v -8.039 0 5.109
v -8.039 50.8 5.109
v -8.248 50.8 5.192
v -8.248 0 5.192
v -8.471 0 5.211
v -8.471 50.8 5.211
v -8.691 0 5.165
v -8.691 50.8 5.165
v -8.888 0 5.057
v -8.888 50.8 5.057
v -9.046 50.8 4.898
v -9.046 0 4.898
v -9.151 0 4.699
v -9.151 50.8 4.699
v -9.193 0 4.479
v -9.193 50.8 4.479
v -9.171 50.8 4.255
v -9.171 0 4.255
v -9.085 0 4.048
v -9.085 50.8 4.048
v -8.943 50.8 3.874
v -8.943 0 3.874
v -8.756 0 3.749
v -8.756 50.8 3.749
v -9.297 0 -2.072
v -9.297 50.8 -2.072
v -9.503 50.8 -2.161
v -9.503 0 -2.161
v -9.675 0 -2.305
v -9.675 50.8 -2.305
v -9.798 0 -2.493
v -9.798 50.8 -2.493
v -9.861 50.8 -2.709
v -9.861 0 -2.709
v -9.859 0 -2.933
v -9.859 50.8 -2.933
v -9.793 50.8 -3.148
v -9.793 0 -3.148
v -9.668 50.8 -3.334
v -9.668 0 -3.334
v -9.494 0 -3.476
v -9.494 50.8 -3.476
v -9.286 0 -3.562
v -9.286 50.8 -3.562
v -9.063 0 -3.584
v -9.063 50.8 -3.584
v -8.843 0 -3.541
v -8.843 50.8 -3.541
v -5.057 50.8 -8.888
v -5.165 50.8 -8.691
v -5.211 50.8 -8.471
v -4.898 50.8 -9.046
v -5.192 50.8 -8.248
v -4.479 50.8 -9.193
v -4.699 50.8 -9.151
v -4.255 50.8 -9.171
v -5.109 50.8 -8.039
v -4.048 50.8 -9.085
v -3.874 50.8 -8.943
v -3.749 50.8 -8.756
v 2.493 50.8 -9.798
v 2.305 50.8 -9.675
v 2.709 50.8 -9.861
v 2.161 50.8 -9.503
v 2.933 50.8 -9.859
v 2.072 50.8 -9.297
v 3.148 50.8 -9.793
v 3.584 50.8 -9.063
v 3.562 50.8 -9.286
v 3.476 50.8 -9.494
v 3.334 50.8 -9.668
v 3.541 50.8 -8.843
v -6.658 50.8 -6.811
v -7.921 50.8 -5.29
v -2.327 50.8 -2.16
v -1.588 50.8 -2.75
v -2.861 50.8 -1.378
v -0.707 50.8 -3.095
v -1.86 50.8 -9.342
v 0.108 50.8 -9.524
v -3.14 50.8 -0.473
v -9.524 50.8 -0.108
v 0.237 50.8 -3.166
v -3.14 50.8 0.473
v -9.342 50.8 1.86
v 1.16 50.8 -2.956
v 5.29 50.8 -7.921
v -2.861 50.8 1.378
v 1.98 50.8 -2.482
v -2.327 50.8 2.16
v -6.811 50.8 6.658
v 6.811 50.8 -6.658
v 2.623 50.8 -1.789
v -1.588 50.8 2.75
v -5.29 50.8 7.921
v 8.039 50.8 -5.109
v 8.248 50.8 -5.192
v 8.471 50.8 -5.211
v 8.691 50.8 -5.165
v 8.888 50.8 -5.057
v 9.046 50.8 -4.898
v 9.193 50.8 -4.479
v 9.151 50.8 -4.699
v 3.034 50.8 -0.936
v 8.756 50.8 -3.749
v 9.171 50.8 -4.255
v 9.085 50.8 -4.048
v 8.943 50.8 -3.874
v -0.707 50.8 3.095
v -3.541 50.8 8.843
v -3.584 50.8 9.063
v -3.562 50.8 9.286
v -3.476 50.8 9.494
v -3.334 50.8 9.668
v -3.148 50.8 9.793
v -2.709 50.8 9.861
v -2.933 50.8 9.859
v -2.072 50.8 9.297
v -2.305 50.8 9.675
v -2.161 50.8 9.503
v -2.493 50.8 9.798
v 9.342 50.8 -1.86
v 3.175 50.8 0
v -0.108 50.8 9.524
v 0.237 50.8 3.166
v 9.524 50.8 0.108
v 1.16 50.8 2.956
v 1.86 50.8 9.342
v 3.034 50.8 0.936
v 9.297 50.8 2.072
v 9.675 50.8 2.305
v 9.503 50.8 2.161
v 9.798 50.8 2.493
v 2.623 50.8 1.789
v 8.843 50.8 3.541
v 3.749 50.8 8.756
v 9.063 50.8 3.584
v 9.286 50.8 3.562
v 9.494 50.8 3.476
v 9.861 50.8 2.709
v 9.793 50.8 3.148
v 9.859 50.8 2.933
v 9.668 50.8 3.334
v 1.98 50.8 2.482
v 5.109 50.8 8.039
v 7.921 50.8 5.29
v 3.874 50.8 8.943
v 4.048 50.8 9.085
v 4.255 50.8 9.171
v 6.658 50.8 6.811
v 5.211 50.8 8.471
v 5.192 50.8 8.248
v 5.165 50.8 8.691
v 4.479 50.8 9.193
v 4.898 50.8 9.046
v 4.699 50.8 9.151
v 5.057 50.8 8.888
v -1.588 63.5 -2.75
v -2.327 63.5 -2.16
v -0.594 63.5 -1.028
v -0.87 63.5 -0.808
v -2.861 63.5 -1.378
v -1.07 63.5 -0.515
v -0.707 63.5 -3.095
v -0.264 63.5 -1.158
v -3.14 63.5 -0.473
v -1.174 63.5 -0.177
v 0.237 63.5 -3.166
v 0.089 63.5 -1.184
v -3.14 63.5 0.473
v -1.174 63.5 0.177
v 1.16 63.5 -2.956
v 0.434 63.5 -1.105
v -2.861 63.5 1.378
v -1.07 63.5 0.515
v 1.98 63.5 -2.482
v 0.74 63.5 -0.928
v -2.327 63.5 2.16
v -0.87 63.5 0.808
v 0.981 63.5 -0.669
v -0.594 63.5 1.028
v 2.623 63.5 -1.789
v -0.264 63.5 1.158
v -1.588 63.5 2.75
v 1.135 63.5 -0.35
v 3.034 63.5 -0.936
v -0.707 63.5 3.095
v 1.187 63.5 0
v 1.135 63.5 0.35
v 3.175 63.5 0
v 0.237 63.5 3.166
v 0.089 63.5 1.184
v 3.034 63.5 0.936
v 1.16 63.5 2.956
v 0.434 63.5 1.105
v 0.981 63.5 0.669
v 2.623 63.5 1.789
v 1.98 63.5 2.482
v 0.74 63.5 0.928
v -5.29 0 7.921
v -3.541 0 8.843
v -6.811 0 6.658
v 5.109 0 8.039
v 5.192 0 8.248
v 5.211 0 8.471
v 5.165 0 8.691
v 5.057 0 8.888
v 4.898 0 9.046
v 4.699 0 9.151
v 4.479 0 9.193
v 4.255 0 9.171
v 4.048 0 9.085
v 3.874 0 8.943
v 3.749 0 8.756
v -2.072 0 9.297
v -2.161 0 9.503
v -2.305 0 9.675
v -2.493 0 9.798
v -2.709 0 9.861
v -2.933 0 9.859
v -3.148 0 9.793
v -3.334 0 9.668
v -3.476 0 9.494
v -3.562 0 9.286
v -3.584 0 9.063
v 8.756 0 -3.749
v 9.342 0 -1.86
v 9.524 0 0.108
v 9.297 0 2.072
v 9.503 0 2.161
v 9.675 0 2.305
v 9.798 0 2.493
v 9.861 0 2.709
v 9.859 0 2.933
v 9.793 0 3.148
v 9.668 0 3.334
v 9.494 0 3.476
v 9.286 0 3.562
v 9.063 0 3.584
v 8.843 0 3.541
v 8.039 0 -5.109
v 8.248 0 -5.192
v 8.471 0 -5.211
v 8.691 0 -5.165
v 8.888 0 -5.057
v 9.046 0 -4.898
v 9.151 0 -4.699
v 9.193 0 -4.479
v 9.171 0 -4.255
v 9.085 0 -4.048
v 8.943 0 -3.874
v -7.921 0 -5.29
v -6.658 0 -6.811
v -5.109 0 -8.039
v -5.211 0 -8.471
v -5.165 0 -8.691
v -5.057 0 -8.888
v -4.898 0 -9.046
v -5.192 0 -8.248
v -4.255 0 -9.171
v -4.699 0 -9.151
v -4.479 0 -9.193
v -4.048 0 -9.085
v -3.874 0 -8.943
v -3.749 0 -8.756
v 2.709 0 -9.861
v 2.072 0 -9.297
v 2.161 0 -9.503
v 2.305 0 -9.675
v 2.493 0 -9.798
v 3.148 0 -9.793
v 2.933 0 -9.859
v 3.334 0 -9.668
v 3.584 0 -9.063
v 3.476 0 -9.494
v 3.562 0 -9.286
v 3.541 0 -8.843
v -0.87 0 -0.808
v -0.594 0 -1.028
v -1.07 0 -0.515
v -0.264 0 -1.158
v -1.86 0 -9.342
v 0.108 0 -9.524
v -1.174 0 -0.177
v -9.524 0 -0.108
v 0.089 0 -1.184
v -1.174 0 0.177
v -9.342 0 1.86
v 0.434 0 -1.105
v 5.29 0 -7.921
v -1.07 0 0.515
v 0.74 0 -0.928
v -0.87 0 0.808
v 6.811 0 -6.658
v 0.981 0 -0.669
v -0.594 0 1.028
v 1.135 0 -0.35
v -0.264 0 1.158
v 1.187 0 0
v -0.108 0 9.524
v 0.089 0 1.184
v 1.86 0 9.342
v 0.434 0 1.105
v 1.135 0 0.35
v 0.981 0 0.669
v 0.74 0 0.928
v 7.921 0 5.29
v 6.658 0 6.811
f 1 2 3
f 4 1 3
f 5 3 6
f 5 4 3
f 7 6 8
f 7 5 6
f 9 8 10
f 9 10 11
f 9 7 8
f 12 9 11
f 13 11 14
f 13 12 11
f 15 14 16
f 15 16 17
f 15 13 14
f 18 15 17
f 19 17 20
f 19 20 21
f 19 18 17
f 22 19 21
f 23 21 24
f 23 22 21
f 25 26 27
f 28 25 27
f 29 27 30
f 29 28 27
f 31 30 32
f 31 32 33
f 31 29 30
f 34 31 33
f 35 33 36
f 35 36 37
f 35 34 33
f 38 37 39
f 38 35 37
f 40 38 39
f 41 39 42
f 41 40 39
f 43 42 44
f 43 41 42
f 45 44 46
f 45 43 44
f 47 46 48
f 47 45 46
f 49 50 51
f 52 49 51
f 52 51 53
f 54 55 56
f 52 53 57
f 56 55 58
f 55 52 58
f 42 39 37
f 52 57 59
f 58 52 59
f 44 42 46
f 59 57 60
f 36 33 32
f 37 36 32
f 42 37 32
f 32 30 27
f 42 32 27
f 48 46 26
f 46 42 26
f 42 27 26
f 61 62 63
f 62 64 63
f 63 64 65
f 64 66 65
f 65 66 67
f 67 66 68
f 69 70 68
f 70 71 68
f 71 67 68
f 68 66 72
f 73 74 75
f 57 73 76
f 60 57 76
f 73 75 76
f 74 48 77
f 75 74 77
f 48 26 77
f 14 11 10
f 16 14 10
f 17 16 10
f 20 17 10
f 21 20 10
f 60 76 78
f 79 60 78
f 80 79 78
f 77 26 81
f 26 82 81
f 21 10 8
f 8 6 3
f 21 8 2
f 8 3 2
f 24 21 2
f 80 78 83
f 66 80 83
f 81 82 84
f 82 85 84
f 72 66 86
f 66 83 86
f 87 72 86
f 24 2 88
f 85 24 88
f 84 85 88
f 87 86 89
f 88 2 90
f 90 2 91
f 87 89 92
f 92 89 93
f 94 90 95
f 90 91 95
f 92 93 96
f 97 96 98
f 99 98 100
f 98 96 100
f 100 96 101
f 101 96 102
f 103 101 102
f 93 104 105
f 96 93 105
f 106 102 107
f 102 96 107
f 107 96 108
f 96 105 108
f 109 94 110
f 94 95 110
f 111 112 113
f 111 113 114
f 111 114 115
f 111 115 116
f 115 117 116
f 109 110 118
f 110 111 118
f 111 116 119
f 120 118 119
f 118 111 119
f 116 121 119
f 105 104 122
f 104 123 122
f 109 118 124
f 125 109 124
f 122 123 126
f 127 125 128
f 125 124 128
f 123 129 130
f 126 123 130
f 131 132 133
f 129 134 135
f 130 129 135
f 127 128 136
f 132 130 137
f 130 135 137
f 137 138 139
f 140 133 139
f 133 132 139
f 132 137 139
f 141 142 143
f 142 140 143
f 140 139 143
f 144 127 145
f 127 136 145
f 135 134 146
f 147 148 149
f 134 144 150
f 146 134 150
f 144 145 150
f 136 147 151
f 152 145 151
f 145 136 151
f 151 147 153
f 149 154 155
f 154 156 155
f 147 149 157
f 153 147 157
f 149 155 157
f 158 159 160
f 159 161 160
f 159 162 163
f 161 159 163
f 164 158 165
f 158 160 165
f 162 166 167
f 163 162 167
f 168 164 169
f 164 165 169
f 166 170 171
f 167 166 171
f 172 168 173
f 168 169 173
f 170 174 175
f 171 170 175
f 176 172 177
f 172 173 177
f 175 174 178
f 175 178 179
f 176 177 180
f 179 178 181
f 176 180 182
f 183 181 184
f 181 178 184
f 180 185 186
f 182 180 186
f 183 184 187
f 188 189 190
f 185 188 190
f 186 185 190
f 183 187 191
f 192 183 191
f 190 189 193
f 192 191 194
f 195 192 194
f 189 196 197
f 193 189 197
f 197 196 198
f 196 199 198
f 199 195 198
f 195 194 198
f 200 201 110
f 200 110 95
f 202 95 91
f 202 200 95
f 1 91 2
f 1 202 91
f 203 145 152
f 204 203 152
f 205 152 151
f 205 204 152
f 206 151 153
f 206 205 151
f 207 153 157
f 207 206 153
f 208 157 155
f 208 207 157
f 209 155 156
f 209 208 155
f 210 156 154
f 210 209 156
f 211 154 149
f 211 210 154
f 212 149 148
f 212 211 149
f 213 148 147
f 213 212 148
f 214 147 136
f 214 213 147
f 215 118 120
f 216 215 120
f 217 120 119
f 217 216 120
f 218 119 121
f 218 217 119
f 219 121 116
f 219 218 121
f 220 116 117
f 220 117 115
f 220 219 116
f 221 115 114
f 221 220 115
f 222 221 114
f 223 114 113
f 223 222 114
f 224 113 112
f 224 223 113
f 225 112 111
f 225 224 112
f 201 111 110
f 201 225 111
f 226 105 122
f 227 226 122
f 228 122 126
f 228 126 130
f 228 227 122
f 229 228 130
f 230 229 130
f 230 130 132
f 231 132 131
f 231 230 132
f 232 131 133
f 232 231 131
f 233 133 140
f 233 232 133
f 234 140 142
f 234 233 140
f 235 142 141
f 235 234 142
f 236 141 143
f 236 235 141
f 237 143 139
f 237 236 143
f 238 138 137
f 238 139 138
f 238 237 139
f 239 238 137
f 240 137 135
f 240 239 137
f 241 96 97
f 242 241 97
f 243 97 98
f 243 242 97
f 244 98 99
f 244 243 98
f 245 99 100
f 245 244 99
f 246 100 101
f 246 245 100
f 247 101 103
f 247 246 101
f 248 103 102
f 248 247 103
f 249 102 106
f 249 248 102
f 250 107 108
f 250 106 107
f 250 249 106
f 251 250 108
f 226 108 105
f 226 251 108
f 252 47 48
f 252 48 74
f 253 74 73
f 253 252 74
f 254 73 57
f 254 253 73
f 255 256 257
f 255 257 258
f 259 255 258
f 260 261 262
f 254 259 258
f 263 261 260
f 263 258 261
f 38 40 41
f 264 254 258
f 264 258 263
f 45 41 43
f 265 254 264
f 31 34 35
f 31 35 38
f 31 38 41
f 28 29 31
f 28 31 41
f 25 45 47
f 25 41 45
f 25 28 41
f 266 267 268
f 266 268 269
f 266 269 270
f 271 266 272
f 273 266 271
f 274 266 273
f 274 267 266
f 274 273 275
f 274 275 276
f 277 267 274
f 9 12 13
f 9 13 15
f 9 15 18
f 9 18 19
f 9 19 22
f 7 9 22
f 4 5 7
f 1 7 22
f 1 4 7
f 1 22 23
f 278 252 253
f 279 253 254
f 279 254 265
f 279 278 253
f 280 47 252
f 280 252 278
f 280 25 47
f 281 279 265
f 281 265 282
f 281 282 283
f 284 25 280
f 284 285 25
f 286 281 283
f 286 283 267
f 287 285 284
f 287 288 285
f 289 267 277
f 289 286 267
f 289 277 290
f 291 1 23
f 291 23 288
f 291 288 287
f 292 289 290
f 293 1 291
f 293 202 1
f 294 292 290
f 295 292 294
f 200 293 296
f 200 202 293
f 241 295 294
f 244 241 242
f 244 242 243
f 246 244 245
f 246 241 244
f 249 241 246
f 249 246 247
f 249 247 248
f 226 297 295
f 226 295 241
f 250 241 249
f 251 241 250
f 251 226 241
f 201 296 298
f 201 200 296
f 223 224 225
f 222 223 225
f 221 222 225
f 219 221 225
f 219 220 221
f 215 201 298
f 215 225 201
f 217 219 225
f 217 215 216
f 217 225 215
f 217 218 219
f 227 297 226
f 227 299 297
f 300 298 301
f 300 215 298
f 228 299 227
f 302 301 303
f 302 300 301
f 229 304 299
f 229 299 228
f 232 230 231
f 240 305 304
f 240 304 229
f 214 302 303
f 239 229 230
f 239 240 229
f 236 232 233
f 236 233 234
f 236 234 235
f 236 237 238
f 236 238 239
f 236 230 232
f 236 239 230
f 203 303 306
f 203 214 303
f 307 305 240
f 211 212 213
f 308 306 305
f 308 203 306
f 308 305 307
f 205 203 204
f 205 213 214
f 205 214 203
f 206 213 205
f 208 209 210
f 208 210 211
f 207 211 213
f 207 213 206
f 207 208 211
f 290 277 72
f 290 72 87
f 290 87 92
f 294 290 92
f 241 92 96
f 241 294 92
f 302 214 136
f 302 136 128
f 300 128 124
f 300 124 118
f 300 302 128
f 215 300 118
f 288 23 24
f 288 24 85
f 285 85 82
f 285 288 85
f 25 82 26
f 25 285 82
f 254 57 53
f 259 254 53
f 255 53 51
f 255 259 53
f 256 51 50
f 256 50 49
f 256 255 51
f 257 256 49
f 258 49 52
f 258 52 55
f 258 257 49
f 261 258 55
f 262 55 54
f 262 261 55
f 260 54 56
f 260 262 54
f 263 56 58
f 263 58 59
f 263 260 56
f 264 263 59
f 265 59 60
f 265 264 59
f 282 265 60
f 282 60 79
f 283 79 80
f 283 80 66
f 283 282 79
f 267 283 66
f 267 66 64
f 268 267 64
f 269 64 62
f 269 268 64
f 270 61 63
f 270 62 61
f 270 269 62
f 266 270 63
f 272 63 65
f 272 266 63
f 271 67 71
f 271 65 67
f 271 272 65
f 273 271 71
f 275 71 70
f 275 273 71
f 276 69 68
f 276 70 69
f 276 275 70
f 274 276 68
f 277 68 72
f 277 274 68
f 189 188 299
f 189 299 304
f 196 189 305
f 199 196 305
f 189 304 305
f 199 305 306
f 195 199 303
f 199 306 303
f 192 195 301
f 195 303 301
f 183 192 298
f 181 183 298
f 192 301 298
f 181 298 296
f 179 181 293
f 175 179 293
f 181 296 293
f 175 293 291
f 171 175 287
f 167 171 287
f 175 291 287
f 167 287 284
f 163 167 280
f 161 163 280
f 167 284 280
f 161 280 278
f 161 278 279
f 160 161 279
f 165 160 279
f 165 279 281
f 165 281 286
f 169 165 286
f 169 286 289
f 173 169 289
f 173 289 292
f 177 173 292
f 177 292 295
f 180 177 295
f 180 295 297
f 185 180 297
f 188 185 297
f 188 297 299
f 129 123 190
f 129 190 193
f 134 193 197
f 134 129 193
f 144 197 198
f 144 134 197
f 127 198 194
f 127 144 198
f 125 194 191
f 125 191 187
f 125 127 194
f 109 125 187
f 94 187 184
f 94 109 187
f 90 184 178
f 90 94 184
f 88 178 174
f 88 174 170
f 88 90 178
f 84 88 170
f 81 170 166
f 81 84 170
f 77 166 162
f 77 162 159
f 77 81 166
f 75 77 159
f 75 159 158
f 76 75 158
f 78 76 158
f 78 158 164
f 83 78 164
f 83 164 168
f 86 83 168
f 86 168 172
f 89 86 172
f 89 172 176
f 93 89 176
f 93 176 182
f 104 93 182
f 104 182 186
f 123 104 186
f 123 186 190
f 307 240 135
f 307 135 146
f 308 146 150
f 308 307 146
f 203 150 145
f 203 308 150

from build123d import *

# Parameters (mm, degrees)
F4_R      = 9.525
F6_DEPTH  = 50.8
F5_R      = 0.7691273294
F7_DEPTH  = 50.8
F8_R      = 0.51181
F10_DEPTH = 9.525
F9_R      = 3.175
F11_DEPTH = 63.5
F12_R     = 1.18745
F13_DEPTH = 69.85


with BuildPart() as f6:
    # F4 (on Front) → F6 (new body)
    with BuildSketch(Plane.XZ):
        Circle(F4_R)
    extrude(amount=-F6_DEPTH)

    # F5 (on Front) → F7 (join)
    with BuildSketch(Plane.XZ):
        with Locations((-2.815608135, 9.0993393073)):
            Circle(F5_R)
        with Locations((4.4432689231, 8.4251401339)):
            Circle(F5_R)
        with Locations((9.0993393073, 2.815608135)):
            Circle(F5_R)
        with Locations((8.4251401339, -4.4432689231)):
            Circle(F5_R)
        with Locations((2.815608135, -9.0993393073)):
            Circle(F5_R)
        with Locations((-4.4432689231, -8.4251401339)):
            Circle(F5_R)
        with Locations((-9.0993393073, -2.815608135)):
            Circle(F5_R)
        with Locations((-8.4251401339, 4.4432689231)):
            Circle(F5_R)
    extrude(amount=-F7_DEPTH)

    # F8 (on Front) → F10 (cut)
    with BuildSketch(Plane.XZ):
        Circle(F8_R)
    extrude(amount=-F10_DEPTH, mode=Mode.SUBTRACT)

    # F9 (on Front) → F11 (join)
    with BuildSketch(Plane.XZ):
        Circle(F9_R)
    extrude(amount=-F11_DEPTH)

    # F12 (on Front) → F13 (cut)
    with BuildSketch(Plane.XZ):
        Circle(F12_R)
    extrude(amount=-F13_DEPTH, mode=Mode.SUBTRACT)


solid = f6.part
